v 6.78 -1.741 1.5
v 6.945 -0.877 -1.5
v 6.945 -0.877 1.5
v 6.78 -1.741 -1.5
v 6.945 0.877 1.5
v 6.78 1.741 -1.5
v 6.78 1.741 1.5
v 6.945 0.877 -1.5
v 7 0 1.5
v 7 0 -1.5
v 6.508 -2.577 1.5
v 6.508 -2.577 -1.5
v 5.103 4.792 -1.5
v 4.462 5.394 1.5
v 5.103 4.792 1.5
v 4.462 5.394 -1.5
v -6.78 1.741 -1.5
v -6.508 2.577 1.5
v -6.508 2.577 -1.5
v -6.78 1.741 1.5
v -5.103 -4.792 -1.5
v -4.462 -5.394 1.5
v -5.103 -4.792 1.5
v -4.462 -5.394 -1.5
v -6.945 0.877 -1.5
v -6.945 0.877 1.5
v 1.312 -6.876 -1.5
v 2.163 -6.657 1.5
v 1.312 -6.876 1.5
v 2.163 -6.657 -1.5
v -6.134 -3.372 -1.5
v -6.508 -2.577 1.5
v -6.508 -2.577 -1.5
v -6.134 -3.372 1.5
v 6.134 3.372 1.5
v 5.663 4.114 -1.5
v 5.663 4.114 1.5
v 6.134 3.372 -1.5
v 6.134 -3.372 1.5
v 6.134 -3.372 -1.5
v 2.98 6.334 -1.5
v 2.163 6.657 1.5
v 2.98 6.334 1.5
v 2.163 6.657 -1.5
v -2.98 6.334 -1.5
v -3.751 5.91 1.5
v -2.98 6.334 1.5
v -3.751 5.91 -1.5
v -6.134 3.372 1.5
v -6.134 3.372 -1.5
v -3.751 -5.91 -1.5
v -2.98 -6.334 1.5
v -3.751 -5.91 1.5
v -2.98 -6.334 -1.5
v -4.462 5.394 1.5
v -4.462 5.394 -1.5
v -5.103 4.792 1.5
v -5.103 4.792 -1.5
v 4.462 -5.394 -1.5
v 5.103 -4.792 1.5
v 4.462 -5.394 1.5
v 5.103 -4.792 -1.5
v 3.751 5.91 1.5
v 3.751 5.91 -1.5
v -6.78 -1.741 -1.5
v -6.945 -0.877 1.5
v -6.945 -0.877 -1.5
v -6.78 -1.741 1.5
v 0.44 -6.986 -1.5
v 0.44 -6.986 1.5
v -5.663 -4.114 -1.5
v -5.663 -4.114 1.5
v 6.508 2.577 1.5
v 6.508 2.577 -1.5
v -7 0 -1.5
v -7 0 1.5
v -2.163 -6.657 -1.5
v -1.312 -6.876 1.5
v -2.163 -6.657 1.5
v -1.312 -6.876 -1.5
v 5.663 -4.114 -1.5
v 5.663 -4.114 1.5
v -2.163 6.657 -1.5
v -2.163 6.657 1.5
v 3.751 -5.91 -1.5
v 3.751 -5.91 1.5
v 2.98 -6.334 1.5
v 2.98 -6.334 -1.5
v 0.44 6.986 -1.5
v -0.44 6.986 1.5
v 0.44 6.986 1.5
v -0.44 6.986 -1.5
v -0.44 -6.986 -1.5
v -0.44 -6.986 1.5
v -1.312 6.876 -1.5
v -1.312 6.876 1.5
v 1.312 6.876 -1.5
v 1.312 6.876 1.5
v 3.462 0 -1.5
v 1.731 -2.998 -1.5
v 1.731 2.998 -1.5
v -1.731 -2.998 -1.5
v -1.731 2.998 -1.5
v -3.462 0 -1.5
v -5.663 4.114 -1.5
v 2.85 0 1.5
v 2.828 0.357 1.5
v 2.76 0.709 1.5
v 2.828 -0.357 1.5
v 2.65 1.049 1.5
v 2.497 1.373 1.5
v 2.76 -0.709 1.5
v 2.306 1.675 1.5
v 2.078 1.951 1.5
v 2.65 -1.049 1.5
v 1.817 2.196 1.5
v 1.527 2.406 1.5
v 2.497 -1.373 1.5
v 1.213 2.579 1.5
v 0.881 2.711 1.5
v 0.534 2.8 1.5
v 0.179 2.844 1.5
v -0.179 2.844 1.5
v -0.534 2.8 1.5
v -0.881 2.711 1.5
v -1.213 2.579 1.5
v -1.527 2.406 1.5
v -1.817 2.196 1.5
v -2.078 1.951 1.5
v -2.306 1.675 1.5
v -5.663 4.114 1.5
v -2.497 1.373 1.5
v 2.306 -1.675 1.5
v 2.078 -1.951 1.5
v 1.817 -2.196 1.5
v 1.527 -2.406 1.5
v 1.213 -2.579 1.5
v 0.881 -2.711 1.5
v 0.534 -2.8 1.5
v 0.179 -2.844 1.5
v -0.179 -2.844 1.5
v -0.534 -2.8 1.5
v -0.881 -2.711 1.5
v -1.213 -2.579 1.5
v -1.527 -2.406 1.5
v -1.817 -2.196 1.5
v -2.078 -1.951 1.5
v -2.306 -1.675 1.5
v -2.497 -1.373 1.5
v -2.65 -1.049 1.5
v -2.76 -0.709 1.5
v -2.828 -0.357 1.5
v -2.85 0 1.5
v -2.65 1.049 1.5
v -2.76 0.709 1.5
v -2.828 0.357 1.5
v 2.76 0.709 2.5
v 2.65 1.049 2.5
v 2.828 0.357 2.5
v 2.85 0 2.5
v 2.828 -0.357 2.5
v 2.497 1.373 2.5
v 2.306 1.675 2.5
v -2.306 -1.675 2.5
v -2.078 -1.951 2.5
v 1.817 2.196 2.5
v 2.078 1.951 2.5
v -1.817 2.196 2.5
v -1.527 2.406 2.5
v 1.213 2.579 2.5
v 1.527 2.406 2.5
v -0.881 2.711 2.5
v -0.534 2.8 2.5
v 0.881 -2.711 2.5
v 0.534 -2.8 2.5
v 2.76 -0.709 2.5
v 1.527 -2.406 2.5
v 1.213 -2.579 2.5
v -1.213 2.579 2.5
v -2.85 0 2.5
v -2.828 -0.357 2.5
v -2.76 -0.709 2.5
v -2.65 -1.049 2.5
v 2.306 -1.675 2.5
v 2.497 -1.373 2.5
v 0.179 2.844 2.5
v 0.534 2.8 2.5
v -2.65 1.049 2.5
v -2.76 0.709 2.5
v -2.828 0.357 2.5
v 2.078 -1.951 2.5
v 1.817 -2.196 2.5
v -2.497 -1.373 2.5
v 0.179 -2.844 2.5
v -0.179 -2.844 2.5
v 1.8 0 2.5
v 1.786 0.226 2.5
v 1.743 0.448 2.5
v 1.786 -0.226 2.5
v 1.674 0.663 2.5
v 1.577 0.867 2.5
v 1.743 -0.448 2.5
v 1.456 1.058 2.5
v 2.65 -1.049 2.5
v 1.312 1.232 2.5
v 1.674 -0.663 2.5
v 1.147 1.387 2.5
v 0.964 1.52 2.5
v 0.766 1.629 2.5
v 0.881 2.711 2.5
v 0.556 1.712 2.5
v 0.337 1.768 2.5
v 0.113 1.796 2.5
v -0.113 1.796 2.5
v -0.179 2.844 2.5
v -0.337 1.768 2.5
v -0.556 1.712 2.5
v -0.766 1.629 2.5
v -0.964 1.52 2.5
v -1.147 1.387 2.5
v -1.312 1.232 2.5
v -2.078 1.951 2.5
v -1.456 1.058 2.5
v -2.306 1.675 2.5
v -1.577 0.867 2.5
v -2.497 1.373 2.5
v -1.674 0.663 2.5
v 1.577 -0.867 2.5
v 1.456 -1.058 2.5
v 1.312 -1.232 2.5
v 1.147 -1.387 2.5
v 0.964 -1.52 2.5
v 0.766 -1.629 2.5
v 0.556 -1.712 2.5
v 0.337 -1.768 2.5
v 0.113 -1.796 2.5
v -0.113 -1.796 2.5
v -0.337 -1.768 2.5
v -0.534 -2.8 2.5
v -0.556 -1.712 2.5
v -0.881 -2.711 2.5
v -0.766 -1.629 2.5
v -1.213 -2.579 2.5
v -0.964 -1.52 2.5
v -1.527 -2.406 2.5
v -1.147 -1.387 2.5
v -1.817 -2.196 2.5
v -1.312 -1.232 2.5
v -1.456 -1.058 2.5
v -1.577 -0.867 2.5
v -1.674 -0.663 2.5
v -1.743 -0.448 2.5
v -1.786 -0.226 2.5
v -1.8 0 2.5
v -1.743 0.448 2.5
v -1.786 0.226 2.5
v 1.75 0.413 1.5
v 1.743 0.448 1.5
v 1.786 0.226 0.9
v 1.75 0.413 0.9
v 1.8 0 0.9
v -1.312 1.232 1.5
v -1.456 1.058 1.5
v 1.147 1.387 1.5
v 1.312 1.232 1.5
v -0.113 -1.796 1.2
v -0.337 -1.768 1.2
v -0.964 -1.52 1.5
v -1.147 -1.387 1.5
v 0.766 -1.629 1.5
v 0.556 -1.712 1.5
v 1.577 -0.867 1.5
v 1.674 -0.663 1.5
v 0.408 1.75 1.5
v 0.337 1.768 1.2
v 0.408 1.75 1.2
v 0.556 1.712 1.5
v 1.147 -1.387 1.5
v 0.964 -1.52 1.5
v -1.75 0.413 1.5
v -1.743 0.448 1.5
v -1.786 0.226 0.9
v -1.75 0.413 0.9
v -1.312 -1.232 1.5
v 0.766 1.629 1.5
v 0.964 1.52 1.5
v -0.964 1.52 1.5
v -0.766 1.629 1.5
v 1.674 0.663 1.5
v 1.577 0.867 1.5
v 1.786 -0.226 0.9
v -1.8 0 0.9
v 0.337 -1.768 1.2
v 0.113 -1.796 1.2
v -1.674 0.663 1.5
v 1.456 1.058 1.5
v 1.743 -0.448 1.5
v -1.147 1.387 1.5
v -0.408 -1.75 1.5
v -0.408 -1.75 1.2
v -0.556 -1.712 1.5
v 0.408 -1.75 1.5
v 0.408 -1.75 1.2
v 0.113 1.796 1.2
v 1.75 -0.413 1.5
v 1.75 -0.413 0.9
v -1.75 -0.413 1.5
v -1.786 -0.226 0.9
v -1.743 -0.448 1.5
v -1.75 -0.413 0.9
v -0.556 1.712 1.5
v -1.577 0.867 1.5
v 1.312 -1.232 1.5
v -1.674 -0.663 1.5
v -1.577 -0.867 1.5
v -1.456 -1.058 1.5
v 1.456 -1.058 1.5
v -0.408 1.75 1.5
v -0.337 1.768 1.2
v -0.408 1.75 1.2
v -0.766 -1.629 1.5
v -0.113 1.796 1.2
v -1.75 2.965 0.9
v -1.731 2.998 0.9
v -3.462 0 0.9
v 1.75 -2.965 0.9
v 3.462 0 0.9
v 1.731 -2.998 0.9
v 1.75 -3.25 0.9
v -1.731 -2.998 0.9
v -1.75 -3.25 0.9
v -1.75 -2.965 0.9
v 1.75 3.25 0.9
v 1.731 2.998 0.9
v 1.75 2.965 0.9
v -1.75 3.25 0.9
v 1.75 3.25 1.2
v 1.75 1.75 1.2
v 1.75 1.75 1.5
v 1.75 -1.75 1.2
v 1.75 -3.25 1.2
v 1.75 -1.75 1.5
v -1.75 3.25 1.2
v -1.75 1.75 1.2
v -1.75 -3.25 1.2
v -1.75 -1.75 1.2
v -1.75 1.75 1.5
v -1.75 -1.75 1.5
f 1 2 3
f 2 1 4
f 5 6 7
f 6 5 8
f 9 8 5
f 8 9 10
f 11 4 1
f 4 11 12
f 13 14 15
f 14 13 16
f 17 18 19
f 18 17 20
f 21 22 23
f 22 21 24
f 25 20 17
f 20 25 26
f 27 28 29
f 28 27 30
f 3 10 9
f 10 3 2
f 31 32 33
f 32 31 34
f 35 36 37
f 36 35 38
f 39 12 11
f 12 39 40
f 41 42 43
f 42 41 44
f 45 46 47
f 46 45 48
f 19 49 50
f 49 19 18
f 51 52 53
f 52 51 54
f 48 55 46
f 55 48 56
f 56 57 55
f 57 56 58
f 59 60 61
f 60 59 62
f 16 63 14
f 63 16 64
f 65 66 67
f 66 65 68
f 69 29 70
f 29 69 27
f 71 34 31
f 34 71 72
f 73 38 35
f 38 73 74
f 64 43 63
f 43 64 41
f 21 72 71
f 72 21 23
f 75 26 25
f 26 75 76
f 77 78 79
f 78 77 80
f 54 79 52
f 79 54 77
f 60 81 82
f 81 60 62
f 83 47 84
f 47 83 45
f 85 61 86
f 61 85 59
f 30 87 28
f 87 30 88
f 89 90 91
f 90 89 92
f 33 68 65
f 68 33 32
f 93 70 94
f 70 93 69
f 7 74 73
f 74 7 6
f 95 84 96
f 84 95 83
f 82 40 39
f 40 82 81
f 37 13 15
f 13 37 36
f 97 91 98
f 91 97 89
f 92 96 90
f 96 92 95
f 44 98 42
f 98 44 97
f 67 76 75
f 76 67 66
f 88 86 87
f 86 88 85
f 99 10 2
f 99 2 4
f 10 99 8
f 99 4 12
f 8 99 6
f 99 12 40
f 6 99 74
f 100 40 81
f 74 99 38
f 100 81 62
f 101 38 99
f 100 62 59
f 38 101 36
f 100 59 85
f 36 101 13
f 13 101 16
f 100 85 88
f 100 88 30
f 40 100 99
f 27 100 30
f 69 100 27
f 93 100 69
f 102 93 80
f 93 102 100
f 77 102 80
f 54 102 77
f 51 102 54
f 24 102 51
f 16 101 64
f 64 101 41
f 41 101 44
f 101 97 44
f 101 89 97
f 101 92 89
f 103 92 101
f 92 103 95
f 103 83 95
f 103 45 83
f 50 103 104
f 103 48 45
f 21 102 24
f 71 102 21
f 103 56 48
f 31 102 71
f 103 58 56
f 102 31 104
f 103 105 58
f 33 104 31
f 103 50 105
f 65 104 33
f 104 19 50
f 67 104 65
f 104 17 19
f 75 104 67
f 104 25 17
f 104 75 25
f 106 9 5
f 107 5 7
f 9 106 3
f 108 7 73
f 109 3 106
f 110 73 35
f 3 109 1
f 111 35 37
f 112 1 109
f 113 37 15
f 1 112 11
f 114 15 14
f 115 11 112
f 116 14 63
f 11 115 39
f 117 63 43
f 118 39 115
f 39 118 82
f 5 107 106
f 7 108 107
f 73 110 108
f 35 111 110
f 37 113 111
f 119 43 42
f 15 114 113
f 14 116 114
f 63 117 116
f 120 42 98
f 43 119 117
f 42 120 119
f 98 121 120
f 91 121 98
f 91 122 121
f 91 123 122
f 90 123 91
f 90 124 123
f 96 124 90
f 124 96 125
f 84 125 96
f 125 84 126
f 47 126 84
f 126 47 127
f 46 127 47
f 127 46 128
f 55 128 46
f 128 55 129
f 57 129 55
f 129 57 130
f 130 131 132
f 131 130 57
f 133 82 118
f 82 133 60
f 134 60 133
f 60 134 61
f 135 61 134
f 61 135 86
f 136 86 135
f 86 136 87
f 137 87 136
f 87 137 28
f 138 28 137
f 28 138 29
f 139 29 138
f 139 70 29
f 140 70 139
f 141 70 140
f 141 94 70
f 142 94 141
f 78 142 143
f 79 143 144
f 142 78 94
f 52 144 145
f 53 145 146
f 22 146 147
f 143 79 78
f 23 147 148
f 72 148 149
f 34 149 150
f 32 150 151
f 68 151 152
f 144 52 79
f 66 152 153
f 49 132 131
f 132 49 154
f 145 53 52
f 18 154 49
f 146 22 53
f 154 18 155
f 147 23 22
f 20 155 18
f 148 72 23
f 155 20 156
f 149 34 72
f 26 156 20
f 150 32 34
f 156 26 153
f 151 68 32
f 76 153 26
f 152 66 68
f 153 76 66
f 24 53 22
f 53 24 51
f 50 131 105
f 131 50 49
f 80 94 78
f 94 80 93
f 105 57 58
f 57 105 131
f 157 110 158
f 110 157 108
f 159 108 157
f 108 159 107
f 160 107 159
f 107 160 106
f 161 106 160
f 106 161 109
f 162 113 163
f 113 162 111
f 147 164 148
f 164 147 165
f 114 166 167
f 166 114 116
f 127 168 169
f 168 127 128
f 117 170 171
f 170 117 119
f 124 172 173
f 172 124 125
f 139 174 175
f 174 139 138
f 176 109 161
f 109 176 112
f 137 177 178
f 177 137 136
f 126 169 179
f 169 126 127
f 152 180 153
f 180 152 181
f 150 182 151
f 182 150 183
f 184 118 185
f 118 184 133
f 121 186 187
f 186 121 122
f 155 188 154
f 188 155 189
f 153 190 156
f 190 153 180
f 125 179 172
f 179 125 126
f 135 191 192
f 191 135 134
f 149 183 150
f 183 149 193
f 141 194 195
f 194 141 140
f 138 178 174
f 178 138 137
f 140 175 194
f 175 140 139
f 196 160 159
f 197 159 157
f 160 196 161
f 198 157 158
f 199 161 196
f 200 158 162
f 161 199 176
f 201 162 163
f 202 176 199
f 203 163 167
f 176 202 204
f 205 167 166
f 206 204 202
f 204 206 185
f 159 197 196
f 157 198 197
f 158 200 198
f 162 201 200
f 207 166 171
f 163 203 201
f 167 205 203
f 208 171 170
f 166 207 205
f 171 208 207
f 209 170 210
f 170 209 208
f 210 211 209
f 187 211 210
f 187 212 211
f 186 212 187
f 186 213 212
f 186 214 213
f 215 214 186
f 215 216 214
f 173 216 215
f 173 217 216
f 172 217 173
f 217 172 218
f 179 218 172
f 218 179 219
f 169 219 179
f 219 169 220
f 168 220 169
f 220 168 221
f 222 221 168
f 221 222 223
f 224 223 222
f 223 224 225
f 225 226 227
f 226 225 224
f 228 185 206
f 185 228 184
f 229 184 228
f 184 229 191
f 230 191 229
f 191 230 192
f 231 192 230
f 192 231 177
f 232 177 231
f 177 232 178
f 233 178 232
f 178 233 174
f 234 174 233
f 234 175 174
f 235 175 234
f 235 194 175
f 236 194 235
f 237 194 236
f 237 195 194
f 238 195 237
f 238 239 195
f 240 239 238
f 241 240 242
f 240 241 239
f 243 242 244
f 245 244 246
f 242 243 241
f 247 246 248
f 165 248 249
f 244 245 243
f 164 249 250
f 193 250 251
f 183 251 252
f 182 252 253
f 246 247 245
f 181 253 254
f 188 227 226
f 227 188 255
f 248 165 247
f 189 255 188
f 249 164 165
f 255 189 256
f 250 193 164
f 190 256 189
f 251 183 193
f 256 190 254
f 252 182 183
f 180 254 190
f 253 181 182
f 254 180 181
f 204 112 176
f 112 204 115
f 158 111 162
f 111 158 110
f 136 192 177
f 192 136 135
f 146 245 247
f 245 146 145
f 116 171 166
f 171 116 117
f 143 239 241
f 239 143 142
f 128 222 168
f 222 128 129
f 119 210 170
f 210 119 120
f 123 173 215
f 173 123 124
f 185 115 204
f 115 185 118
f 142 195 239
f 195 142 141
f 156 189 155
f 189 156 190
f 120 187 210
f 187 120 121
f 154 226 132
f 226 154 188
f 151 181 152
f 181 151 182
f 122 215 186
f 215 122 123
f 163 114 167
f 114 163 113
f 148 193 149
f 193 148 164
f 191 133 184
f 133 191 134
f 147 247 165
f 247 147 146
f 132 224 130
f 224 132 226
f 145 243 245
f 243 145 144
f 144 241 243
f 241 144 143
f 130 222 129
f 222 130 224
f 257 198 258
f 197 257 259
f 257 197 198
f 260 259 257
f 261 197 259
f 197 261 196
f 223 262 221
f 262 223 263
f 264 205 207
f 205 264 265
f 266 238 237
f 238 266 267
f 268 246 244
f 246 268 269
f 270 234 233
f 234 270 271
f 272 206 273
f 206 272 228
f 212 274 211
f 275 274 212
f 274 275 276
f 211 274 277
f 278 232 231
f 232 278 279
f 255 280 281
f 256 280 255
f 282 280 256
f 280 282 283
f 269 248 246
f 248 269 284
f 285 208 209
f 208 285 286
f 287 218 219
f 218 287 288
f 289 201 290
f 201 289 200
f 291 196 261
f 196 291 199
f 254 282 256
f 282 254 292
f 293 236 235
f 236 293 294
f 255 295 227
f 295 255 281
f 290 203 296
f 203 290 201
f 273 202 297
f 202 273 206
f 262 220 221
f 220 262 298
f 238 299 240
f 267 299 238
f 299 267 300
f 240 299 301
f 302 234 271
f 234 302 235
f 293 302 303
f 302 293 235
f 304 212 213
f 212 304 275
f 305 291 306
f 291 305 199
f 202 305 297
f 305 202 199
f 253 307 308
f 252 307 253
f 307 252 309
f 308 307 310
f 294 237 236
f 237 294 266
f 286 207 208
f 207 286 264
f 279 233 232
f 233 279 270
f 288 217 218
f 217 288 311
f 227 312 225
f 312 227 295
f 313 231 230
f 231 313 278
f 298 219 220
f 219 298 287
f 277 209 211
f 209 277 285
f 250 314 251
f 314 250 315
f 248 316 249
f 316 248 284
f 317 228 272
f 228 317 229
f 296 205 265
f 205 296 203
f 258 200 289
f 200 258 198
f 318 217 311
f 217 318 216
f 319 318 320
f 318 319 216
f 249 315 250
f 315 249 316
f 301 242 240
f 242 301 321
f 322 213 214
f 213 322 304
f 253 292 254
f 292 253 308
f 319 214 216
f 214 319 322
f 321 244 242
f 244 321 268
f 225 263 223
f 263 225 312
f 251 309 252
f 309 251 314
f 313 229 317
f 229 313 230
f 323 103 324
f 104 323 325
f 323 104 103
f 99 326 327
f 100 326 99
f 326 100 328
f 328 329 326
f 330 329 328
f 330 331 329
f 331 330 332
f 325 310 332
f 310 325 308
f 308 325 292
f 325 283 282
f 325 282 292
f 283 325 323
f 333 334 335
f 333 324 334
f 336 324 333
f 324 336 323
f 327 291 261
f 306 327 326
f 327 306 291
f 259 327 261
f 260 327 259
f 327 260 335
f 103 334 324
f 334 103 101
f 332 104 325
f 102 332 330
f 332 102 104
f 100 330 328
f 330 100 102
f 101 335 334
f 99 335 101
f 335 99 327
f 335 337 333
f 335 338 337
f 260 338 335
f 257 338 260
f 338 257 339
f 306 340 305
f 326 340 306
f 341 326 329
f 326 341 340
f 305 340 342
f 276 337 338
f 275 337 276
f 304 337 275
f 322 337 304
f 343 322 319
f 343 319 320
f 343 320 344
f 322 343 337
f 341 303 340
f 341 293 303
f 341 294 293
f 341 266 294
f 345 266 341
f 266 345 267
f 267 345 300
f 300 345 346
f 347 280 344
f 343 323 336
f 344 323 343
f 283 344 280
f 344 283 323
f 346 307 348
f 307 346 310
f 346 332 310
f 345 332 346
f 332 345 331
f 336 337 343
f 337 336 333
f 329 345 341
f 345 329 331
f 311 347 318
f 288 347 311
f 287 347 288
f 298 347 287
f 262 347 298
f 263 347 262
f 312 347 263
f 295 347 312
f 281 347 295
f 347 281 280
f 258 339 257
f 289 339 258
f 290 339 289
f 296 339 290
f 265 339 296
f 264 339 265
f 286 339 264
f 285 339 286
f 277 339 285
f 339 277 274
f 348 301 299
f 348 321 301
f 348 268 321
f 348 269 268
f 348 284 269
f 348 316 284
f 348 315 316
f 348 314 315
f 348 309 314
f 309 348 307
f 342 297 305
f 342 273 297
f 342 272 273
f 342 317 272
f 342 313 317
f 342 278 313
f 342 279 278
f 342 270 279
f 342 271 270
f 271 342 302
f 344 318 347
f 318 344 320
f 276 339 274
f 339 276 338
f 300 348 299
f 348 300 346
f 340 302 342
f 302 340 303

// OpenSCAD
$fn = 50;


difference() {
	union() {
		translate(v = [0, 0, -1.5000000000]) {
			rotate(a = [0, 0, 0]) {
				cylinder(h = 3, r = 7.0000000000);
			}
		}
		translate(v = [0, 0, -1.5000000000]) {
			rotate(a = [0, 0, 0]) {
				cylinder(h = 4, r = 2.8500000000);
			}
		}
	}
	union() {
		translate(v = [0, 0, -125.0000000000]) {
			rotate(a = [0, 0, 0]) {
				cylinder(h = 250, r = 1.8000000000);
			}
		}
		translate(v = [0, 0, -2.1000000000]) {
			rotate(a = [0, 0, 0]) {
				#translate(v = [0, 0, 0]) {
					rotate(a = [0, 0, 0]) {
						linear_extrude(height = 3) {
							polygon(points = [[3.4620000000, 0.0000000000], [1.7310000000, 2.9981799479], [-1.7310000000, 2.9981799479], [-3.4620000000, 0.0000000000], [-1.7310000000, -2.9981799479], [1.7310000000, -2.9981799479]]);
						}
					}
				}
			}
		}
		#translate(v = [-1.7500000000, -3.2500000000, 0.9000000000]) {
			rotate(a = [0, 0, 0]) {
				cube(size = [3.5000000000, 6.5000000000, 0.3000000000]);
			}
		}
		#translate(v = [-1.7500000000, -1.7500000000, 1.2000000000]) {
			rotate(a = [0, 0, 0]) {
				cube(size = [3.5000000000, 3.5000000000, 0.3000000000]);
			}
		}
		#translate(v = [-1.7500000000, -3.2500000000, -2.4000000000]) {
			rotate(a = [0, 0, 0]) {
				cube(size = [3.5000000000, 6.5000000000, 0.3000000000]);
			}
		}
		#translate(v = [-1.7500000000, -1.7500000000, -2.7000000000]) {
			rotate(a = [0, 0, 0]) {
				cube(size = [3.5000000000, 3.5000000000, 0.3000000000]);
			}
		}
	}
}
